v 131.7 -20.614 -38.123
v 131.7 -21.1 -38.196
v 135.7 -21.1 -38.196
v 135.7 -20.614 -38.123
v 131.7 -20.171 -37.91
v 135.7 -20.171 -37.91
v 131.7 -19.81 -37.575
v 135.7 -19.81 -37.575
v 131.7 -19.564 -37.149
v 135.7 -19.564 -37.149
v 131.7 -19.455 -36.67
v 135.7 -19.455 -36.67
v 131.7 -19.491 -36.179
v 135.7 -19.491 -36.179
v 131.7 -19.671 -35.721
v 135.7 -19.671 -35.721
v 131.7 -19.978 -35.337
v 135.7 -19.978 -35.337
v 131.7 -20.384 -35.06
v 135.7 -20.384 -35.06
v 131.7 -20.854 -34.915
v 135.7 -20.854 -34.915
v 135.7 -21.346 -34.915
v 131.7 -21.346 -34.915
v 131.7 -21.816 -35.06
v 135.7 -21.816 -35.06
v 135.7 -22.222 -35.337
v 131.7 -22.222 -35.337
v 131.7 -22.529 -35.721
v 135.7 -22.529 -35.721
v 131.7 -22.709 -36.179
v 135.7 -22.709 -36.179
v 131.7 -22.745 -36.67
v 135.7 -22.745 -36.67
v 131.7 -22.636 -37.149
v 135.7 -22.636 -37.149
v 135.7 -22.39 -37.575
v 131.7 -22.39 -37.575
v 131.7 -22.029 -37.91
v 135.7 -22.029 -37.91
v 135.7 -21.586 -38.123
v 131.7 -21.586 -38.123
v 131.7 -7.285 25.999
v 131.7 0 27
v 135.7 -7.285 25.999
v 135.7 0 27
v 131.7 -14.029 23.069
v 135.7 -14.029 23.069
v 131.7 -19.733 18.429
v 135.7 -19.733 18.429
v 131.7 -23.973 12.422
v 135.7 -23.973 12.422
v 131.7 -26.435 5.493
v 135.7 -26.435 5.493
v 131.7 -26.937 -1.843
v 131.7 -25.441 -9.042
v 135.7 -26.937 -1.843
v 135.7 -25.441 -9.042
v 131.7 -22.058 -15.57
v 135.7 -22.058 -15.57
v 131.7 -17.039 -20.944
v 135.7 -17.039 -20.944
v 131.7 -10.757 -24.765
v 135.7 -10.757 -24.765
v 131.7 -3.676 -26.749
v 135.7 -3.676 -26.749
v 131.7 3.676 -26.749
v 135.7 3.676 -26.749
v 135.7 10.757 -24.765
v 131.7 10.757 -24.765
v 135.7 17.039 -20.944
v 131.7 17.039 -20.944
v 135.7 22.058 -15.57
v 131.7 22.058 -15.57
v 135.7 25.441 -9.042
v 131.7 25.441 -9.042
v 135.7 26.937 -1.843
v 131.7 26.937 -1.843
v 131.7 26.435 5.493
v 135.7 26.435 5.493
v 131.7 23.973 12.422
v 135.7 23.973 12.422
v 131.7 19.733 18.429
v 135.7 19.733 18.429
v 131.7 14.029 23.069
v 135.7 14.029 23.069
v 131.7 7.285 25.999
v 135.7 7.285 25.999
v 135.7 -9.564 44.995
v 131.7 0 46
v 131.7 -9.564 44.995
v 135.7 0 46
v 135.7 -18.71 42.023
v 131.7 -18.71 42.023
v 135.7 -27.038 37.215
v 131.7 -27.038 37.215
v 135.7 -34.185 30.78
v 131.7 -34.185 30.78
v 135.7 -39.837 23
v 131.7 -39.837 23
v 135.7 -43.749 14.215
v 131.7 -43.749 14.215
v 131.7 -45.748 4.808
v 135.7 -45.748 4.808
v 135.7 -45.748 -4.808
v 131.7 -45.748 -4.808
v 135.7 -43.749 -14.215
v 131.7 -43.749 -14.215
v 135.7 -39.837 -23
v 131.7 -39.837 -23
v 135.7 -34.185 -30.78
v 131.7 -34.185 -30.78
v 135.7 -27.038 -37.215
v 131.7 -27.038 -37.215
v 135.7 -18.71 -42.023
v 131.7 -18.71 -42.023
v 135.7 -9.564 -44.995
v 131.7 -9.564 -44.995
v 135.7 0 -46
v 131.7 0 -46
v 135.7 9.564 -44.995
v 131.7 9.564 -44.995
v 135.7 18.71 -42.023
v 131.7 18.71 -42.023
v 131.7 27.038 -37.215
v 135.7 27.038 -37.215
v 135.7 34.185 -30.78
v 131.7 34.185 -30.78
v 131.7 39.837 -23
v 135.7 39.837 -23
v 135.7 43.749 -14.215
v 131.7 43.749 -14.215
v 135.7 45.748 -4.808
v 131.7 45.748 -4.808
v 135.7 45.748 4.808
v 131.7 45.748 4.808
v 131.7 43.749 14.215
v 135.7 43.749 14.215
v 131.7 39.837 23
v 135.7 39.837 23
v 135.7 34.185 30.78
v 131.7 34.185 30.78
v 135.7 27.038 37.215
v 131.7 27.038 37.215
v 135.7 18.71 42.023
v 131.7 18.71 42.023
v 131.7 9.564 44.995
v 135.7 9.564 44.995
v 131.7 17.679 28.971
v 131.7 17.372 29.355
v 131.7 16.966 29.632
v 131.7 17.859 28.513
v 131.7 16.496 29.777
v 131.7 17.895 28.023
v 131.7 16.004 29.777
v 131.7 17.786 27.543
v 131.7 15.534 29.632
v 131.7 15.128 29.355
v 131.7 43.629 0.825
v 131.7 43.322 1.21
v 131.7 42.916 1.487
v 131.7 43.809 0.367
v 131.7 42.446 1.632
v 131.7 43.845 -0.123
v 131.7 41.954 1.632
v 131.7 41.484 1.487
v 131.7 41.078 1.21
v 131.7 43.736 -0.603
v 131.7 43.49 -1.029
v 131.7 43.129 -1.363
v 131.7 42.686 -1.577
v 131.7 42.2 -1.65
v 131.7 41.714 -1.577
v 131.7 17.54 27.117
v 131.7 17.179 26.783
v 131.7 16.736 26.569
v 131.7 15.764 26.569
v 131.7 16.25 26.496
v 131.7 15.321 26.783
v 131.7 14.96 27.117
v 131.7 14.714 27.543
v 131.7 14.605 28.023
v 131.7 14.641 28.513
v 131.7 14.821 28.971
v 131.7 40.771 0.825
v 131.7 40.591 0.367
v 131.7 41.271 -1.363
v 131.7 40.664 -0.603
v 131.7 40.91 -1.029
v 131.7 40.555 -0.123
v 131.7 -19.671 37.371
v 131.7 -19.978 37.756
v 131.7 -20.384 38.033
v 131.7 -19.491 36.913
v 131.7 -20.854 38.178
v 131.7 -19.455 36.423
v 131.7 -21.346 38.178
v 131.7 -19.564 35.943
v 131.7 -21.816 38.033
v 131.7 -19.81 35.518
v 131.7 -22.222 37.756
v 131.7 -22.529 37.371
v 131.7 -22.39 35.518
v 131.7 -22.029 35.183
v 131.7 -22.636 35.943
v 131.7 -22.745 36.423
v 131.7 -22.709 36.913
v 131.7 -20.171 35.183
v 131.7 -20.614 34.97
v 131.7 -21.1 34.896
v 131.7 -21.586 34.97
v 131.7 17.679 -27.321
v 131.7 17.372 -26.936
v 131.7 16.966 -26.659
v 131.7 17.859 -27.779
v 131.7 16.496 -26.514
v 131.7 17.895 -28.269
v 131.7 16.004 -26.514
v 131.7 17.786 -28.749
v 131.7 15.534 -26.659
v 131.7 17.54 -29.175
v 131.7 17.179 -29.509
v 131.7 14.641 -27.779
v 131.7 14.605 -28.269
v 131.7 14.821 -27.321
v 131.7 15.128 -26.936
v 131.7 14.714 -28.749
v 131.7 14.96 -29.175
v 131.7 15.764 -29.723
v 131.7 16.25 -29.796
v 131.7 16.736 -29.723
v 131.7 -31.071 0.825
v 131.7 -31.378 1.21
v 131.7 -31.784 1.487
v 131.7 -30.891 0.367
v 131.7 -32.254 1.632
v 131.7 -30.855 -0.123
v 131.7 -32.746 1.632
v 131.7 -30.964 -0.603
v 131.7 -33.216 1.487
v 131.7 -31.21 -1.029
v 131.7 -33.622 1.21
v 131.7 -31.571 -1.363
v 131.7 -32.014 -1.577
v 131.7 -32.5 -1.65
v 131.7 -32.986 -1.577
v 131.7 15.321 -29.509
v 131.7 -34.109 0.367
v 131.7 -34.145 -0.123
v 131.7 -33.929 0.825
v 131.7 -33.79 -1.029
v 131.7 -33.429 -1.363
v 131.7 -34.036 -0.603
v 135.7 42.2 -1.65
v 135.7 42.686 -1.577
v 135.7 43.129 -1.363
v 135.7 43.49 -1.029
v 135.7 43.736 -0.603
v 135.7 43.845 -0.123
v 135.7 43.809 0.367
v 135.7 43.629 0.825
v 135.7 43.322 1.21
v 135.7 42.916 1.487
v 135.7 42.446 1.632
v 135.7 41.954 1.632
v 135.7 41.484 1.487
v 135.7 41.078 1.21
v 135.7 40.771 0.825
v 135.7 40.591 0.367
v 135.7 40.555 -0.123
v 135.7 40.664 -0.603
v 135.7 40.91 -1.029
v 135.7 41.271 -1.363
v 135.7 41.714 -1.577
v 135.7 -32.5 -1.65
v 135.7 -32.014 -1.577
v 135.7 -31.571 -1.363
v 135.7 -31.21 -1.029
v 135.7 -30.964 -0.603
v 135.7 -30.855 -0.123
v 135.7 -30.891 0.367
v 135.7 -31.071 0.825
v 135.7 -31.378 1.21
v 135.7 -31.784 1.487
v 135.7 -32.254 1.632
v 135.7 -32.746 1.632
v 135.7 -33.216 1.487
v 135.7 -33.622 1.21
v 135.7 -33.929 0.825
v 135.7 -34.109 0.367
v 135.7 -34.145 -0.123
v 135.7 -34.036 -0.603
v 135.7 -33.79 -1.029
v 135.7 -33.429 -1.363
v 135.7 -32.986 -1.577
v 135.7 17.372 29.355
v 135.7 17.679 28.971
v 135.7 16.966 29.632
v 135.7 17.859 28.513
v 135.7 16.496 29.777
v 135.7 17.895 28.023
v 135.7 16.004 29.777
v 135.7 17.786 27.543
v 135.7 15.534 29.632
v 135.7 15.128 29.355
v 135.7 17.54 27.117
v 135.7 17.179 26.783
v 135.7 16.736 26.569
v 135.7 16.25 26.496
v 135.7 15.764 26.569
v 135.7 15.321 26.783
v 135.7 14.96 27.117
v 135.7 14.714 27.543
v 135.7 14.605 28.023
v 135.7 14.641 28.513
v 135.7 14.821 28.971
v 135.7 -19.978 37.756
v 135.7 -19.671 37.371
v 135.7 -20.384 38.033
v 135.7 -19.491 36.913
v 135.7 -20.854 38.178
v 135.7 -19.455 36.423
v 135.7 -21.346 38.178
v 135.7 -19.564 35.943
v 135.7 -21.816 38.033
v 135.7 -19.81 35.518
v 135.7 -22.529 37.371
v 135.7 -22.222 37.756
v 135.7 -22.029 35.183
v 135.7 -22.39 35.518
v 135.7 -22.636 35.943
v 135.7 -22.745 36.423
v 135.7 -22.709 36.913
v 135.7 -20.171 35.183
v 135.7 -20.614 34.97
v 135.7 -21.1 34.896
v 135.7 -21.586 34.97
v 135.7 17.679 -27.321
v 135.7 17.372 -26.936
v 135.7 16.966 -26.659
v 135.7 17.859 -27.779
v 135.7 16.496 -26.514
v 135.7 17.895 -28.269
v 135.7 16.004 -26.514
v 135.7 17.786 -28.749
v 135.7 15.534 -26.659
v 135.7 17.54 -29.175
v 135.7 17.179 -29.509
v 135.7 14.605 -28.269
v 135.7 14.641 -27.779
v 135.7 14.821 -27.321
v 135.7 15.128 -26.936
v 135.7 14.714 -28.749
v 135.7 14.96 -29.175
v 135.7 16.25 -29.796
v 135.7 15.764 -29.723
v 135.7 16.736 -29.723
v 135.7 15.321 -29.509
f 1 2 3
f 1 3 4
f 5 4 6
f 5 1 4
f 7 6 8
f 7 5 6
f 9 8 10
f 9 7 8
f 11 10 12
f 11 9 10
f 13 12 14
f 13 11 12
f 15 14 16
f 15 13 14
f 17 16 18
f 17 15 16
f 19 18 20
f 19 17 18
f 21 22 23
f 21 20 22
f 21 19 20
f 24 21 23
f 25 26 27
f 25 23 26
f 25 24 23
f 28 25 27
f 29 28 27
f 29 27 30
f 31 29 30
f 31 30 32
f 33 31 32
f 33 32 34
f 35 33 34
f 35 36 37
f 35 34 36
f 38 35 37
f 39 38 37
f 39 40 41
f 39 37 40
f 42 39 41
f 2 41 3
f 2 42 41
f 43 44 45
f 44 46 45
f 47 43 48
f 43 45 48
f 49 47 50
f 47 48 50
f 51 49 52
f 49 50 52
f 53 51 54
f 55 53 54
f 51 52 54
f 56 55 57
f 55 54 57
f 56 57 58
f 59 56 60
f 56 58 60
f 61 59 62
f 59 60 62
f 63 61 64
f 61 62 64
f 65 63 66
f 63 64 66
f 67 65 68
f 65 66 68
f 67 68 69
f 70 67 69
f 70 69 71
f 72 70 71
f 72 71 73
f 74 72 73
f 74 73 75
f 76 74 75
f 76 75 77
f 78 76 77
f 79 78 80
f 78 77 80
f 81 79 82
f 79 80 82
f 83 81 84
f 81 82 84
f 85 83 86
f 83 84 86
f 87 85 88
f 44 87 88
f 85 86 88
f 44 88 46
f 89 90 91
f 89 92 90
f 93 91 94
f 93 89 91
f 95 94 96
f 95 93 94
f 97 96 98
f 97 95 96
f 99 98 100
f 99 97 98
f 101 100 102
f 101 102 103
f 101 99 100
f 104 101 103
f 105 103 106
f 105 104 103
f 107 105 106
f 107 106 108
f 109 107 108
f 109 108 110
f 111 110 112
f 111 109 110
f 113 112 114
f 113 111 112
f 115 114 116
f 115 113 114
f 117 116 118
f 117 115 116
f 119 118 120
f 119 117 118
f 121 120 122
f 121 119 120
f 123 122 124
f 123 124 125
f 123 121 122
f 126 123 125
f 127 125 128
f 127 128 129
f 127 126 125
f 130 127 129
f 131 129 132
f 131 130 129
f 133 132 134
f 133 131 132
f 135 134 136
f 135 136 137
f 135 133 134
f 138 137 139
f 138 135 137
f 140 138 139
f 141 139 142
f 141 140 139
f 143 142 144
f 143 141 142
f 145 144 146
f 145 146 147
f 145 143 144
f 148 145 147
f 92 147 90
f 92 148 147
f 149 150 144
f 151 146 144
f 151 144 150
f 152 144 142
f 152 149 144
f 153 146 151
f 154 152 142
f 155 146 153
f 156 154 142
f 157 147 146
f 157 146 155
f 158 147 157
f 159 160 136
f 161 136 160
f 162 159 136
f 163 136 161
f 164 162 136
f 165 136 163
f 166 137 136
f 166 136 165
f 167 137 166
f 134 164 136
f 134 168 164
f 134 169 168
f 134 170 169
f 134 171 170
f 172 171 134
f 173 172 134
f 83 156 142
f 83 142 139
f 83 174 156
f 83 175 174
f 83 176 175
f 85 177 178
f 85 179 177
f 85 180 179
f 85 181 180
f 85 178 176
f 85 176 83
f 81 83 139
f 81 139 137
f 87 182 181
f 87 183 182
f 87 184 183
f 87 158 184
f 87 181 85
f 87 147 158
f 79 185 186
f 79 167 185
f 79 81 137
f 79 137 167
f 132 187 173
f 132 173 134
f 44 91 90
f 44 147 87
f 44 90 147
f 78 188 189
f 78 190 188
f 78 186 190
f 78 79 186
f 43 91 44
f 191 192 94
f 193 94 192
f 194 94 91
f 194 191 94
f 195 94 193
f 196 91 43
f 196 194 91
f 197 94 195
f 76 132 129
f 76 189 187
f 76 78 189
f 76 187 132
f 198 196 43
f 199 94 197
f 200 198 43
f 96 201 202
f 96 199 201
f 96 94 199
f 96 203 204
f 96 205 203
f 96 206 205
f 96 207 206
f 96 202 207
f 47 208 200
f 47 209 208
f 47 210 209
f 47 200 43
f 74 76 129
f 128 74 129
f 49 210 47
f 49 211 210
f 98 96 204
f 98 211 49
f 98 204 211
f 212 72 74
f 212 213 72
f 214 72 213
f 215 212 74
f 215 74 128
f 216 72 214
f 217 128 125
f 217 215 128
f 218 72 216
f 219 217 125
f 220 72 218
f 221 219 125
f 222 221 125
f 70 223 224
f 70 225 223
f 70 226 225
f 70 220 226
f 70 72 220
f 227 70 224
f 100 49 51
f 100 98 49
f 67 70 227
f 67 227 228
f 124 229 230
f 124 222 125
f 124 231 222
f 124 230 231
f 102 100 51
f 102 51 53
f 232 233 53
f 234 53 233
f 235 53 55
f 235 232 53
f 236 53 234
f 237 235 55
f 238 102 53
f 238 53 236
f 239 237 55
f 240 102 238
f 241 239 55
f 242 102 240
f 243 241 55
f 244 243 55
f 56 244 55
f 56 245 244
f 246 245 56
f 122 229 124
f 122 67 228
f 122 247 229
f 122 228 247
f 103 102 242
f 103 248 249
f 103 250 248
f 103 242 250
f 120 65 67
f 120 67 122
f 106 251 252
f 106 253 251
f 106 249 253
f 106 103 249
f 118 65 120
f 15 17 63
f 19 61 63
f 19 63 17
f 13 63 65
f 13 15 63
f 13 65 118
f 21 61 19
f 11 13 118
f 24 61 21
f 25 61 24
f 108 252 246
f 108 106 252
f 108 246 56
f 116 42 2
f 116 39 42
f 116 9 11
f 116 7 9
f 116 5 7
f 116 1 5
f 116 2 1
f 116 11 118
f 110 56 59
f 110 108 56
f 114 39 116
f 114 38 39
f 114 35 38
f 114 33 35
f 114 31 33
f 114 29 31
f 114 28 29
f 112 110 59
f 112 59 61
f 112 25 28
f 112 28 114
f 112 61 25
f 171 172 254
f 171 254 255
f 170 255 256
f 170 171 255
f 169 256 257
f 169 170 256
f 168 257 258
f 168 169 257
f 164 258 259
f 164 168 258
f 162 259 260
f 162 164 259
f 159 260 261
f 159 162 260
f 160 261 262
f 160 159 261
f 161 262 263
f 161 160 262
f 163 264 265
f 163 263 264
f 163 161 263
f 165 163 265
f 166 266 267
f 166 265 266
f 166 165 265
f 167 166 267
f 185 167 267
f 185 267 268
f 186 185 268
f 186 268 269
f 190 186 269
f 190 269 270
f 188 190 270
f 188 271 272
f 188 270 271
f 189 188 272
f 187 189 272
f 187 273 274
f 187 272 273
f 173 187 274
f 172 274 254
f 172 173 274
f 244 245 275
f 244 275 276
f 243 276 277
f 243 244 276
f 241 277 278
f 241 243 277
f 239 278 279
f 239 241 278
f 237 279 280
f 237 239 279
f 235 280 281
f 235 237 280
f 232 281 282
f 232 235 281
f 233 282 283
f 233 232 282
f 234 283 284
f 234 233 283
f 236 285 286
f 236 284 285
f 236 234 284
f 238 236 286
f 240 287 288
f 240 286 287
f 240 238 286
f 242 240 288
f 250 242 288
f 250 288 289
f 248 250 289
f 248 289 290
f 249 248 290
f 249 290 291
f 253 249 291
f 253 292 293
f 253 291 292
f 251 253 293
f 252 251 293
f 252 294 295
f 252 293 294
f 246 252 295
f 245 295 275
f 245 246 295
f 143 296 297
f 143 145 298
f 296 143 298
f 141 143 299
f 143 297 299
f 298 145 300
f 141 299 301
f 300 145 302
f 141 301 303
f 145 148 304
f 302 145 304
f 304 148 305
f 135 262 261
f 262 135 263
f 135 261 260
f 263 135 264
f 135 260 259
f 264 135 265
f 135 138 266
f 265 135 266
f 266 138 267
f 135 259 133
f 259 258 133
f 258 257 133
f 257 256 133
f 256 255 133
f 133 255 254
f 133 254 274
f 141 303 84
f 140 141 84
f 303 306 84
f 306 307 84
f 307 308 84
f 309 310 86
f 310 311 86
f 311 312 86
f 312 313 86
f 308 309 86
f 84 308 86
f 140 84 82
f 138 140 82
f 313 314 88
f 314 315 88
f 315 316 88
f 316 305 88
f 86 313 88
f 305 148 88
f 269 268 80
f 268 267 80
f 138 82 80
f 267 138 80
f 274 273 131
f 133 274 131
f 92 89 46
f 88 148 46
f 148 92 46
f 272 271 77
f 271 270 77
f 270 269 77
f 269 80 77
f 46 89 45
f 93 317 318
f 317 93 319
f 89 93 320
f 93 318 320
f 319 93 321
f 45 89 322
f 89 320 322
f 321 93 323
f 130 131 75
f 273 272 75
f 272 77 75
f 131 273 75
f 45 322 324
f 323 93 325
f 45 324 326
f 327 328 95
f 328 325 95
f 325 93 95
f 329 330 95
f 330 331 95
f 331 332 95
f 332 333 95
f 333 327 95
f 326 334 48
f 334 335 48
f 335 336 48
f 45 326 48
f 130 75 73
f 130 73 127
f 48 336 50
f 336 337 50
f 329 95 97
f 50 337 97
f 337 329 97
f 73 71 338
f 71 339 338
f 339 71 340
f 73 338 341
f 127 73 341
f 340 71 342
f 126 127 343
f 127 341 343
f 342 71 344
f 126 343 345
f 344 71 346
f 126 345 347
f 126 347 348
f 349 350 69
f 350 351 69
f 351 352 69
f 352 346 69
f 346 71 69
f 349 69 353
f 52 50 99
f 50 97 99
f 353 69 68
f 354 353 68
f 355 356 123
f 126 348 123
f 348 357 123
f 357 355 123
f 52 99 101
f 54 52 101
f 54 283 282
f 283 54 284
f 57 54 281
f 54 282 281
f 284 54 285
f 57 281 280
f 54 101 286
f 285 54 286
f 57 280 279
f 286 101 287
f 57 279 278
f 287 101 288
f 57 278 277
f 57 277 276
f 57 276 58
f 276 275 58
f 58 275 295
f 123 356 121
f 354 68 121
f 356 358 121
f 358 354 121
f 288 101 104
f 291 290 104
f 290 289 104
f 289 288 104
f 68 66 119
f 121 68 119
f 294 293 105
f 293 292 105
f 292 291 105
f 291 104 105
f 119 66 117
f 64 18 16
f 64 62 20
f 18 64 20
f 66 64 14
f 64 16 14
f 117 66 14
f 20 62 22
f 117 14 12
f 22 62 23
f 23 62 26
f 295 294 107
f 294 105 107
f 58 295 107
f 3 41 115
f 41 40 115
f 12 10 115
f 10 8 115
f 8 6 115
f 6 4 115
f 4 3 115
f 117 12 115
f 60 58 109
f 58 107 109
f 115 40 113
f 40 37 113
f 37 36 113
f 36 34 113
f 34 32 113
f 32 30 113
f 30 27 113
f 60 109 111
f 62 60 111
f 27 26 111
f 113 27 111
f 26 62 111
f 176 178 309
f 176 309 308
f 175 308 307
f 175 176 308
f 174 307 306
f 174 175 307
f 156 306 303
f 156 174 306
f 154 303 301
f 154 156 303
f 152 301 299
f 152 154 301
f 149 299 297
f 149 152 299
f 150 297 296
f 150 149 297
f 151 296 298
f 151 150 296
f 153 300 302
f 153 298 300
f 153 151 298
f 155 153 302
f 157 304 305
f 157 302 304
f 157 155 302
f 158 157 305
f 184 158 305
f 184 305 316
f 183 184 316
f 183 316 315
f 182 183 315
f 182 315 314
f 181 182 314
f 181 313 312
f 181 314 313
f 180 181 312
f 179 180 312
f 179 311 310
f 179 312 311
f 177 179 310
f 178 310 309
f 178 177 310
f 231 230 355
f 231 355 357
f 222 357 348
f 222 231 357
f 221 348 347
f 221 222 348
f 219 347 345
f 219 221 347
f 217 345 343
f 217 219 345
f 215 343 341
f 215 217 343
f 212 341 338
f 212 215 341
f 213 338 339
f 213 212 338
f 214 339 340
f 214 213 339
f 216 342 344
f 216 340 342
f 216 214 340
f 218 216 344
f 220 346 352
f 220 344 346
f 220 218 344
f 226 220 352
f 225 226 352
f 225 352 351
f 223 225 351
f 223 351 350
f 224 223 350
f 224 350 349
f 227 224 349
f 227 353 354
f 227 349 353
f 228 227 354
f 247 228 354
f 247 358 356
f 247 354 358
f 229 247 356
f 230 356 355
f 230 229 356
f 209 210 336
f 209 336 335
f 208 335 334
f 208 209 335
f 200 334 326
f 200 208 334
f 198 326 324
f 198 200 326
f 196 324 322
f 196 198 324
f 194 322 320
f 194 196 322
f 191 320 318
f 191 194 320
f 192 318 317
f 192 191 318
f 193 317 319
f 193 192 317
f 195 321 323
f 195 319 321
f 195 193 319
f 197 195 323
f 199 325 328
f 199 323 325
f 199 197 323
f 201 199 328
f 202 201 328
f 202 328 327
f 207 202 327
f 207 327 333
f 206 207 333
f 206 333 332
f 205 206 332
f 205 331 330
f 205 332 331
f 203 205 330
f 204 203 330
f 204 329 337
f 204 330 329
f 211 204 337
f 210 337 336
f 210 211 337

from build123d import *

# Parameters (mm, degrees)
AXIAL_PROFILE_MM_W     = 4
AXIAL_PROFILE_MM_H     = 19
AXIAL_HOLES_DEPTH      = 151.487507787
AXIAL_HOLES_DEPTH_BACK = 151.487507787
SKETCH2_R              = 1.65


with BuildPart() as part:
    # Axial profile (mm) → Full revolution (revolve)
    with BuildSketch(Plane.XY, mode=Mode.PRIVATE) as full_revolution_sk:
        with Locations((133.7, 36.5)):
            Rectangle(AXIAL_PROFILE_MM_W, AXIAL_PROFILE_MM_H)
    revolve(full_revolution_sk.sketch.rotate(Axis((-110, 0, 0), (1, 0, 0)), 90), axis=Axis((-110, 0, 0), (1, 0, 0)))

    # Sketch2 → Axial holes (cut, two sides: drawn at the far end of the back side and taken through both)
    with BuildSketch(Plane(origin=(0, 0, 0), x_dir=(0, 0, -1), z_dir=(1, 0, 0)).offset(-AXIAL_HOLES_DEPTH_BACK)):
        with Locations((0, 42.2)):
            Circle(SKETCH2_R)
        with Locations((-36.54627204, -21.1)):
            Circle(SKETCH2_R)
        with Locations((36.54627204, -21.1)):
            Circle(SKETCH2_R)
        with Locations((-28.145825623, 16.25)):
            Circle(SKETCH2_R)
        with Locations((0, -32.5)):
            Circle(SKETCH2_R)
        with Locations((28.145825623, 16.25)):
            Circle(SKETCH2_R)
    extrude(amount=AXIAL_HOLES_DEPTH + AXIAL_HOLES_DEPTH_BACK, mode=Mode.SUBTRACT)


solid = part.part
